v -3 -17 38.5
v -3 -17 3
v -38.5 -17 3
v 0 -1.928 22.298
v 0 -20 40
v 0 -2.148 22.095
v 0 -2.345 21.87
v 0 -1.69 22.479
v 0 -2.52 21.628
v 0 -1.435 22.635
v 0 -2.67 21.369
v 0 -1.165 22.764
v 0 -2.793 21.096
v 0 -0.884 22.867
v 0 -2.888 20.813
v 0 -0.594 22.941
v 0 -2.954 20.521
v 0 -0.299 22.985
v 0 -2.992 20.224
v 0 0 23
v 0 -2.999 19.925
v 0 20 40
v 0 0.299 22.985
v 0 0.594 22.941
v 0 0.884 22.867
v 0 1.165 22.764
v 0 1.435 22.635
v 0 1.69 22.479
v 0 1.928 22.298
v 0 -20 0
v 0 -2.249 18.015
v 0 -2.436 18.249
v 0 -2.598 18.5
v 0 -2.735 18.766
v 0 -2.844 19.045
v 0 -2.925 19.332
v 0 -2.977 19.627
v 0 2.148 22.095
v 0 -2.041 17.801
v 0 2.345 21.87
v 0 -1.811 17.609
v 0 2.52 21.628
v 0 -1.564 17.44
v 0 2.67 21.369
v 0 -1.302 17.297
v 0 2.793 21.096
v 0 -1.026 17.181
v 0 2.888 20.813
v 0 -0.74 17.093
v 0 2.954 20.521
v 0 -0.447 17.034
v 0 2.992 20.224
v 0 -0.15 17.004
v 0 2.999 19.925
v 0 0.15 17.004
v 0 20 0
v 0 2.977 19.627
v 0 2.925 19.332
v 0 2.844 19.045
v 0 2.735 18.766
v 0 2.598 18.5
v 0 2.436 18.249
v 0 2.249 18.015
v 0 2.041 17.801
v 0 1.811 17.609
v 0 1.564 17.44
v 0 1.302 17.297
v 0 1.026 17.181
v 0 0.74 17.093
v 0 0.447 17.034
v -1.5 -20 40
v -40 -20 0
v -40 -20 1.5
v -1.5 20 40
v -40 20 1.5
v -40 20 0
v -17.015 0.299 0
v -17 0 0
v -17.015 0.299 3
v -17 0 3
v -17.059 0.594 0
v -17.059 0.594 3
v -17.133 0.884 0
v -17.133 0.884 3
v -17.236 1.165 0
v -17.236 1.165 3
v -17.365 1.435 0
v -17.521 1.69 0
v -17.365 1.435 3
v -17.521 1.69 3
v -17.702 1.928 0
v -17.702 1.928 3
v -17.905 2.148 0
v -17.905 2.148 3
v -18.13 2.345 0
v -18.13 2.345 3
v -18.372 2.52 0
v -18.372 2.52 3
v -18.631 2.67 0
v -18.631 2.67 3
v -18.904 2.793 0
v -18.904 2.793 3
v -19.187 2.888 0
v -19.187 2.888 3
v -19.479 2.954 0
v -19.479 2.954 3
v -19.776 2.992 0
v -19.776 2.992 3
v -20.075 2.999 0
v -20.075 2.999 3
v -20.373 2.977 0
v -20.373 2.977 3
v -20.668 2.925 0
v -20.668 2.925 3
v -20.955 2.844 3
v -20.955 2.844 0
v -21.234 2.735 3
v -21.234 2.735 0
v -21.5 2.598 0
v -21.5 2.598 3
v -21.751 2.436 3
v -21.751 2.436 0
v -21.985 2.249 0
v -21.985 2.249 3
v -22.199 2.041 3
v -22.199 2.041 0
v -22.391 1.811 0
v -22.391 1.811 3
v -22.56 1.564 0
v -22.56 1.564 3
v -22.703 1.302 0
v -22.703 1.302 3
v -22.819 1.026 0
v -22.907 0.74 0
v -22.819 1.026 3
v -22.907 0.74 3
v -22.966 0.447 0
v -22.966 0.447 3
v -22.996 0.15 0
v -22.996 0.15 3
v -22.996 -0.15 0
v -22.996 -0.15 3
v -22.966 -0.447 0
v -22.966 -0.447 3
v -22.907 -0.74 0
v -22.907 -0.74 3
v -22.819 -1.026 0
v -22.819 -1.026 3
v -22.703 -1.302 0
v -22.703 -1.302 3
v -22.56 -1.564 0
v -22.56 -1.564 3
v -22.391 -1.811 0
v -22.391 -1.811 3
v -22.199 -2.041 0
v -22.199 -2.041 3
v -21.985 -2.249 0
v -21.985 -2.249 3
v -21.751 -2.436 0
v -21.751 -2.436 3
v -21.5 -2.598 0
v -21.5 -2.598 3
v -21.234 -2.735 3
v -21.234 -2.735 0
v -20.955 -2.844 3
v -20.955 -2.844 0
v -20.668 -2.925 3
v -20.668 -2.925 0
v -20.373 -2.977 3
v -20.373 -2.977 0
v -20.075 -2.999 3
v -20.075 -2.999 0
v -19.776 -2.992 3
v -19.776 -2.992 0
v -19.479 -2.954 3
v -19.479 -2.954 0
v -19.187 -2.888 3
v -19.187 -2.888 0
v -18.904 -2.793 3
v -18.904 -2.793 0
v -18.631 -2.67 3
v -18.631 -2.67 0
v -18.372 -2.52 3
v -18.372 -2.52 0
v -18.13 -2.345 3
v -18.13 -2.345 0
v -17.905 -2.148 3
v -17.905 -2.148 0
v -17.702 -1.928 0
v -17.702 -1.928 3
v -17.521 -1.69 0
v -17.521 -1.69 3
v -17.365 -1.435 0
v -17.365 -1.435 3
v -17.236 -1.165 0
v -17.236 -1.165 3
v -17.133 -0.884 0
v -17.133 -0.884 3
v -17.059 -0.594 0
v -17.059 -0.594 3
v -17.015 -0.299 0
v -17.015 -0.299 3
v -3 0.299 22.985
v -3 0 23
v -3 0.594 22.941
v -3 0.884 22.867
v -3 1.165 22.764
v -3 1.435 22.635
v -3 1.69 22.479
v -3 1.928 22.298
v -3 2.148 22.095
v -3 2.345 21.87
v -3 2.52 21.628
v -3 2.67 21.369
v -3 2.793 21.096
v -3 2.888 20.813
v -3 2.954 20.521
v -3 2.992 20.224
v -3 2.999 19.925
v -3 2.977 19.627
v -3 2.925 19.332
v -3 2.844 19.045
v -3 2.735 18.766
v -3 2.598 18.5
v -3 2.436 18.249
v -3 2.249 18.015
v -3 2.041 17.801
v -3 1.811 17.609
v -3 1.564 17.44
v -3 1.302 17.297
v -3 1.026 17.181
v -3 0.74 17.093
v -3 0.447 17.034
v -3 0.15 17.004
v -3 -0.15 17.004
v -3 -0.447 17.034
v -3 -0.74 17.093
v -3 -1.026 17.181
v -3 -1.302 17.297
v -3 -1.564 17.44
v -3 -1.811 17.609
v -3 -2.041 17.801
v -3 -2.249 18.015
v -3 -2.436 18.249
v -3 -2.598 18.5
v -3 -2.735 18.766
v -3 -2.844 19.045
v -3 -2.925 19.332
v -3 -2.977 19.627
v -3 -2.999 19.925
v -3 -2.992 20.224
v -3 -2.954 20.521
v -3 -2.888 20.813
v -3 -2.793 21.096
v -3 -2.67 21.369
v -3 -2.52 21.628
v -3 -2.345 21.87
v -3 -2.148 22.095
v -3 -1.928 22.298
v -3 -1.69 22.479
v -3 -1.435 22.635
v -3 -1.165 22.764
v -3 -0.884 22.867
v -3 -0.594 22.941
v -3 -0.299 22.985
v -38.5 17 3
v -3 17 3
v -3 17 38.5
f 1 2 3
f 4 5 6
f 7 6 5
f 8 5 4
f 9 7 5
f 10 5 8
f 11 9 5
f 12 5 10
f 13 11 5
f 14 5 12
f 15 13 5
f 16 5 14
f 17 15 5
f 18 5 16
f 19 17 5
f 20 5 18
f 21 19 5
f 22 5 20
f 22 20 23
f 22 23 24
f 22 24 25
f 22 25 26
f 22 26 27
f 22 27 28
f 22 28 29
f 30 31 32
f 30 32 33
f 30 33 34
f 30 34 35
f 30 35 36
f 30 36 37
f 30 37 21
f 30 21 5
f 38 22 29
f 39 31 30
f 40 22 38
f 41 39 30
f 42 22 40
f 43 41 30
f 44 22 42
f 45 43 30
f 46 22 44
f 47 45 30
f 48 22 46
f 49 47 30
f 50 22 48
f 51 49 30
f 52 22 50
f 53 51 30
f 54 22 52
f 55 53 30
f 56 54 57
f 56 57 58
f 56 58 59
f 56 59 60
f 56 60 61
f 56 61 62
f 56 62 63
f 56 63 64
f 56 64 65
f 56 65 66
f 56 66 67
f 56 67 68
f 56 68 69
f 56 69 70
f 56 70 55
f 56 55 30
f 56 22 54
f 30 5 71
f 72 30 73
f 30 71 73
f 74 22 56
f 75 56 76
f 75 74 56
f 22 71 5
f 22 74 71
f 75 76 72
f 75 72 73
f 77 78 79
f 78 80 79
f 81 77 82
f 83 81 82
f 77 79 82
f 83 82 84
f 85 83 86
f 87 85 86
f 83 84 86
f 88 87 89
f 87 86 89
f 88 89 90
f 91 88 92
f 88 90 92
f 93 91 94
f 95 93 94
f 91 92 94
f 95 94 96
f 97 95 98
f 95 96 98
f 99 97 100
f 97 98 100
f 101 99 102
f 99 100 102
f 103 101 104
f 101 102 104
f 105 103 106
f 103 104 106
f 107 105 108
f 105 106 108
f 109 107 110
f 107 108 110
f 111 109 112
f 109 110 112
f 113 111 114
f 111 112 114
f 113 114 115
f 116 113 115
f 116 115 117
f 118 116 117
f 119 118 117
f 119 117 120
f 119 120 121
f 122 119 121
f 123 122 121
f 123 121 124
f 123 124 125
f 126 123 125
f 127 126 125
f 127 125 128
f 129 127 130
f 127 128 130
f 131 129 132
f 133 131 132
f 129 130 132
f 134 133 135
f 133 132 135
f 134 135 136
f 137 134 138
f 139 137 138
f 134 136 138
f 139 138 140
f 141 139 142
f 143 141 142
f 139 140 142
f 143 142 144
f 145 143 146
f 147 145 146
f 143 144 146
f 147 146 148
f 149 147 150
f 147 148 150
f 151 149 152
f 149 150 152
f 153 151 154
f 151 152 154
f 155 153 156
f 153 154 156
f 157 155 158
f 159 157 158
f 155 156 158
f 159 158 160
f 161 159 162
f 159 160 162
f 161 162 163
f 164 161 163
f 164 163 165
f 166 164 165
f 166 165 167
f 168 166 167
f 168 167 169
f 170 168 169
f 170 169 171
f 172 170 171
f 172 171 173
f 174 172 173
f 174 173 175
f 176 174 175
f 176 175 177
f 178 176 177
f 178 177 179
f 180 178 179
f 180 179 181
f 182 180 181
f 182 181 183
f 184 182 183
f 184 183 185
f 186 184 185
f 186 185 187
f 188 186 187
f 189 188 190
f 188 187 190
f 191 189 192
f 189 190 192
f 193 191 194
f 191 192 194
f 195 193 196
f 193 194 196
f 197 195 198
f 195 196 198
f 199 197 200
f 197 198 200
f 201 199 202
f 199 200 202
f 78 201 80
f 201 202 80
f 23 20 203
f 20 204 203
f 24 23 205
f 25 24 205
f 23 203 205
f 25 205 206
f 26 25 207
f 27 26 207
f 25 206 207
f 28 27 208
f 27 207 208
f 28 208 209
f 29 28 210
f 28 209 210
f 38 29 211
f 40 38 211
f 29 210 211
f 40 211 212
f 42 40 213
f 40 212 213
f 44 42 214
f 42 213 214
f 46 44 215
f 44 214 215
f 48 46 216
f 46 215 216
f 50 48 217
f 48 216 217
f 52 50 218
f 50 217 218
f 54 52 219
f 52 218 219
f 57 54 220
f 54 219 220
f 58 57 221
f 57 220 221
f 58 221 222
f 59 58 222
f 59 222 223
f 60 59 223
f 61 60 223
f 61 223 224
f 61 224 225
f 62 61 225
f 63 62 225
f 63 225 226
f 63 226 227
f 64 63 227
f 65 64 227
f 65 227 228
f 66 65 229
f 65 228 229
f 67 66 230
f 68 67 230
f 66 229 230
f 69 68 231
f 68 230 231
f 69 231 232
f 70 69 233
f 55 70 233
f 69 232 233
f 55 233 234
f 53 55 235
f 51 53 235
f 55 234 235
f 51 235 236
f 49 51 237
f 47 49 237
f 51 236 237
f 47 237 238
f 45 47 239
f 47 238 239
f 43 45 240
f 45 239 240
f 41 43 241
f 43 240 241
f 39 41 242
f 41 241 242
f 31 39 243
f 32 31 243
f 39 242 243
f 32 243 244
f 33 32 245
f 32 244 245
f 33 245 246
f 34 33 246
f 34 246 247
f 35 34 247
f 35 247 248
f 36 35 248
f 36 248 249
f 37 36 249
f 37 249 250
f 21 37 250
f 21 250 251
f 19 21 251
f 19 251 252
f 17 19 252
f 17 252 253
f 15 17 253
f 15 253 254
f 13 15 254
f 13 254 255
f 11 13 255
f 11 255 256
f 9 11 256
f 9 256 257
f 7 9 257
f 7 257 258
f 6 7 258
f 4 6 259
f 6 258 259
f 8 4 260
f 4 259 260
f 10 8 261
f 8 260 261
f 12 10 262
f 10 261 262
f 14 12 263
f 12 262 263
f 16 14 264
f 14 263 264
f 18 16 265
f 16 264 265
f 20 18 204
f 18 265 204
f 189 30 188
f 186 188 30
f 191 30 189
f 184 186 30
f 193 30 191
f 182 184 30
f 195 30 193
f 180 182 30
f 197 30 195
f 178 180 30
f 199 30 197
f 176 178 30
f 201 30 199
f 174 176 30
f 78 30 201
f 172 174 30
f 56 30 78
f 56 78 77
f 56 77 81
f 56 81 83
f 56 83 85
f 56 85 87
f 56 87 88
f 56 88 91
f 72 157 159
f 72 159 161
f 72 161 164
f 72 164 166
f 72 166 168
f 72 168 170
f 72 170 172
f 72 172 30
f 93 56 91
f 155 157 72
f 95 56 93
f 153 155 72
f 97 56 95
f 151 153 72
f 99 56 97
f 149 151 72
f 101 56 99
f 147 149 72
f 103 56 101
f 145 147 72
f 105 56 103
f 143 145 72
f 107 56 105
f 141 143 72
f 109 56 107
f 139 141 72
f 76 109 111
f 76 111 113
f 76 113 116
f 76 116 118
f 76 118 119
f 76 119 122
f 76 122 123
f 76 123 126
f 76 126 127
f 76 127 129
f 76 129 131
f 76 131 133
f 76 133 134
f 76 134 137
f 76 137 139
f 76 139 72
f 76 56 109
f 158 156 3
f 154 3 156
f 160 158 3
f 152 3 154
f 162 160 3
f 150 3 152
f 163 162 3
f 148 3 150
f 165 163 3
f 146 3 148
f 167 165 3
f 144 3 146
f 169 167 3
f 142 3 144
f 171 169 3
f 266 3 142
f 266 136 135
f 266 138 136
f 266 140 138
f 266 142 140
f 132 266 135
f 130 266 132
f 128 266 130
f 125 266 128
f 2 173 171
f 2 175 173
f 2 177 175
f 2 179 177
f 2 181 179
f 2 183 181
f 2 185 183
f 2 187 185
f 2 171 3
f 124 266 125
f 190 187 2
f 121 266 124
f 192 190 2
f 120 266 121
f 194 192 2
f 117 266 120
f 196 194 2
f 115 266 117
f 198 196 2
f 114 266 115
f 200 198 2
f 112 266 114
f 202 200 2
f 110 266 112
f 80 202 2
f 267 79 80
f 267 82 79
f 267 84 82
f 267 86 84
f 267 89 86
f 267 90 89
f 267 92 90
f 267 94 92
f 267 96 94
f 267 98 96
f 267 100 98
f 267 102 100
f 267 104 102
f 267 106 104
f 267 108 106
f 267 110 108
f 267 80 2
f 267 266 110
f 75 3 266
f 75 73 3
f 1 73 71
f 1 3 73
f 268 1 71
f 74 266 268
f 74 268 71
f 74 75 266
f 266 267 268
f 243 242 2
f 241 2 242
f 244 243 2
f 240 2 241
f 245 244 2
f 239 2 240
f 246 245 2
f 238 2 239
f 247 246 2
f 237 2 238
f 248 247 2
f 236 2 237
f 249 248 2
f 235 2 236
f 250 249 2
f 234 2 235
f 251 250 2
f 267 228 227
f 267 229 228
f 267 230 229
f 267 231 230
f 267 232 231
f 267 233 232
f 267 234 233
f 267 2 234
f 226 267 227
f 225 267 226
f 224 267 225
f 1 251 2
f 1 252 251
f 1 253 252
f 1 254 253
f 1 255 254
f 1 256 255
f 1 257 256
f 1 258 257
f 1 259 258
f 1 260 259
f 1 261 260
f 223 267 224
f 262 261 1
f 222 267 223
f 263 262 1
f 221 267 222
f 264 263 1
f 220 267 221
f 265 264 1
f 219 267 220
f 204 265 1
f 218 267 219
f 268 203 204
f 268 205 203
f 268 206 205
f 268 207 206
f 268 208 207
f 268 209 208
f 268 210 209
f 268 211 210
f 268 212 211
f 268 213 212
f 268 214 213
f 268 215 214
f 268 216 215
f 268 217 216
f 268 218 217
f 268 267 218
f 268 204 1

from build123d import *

# Parameters (mm, degrees)
BOSS_EXTRUDE1_DEPTH = 20
SKETCH3_R           = 3
CUT_EXTRUDE1_DEPTH  = 20
SKETCH4_R           = 3
CUT_EXTRUDE2_DEPTH  = 20
BOSS_EXTRUDE2_DEPTH = 3


with BuildPart() as part:
    # Sketch2 → Boss-Extrude1 (new body, symmetric)
    with BuildSketch(Plane(origin=(0, 0, 0), x_dir=(1, 0, 0), z_dir=(0, 1, 0))):
        Polygon((0, 0), (-40, 0), (-40, -1.5), (-38.5, -3), (-3, -3), (-3, -38.5), (-1.5, -40), (0, -40), align=None)
    extrude(amount=BOSS_EXTRUDE1_DEPTH, both=True)

    # Sketch3 → Cut-Extrude1 (cut, symmetric)
    with BuildSketch(Plane.XY.offset(3)):
        with Locations((-20, 0)):
            Circle(SKETCH3_R)
    extrude(amount=CUT_EXTRUDE1_DEPTH, both=True, mode=Mode.SUBTRACT)

    # Sketch4 → Cut-Extrude2 (cut, symmetric)
    with BuildSketch(Plane.ZY.offset(3)):
        with Locations((20, 0)):
            Circle(SKETCH4_R)
    extrude(amount=CUT_EXTRUDE2_DEPTH, both=True, mode=Mode.SUBTRACT)

    # Sketch5 → Boss-Extrude2 (add)
    with BuildSketch(Plane.XZ.offset(20)):
        Polygon((-38.5, 3), (-3, 38.5), (-3, 3), align=None)
    boss_extrude2 = extrude(amount=-BOSS_EXTRUDE2_DEPTH)

    # Mirror1: Boss-Extrude2 across plane
    add(boss_extrude2.mirror(Plane.ZX))


solid = part.part
